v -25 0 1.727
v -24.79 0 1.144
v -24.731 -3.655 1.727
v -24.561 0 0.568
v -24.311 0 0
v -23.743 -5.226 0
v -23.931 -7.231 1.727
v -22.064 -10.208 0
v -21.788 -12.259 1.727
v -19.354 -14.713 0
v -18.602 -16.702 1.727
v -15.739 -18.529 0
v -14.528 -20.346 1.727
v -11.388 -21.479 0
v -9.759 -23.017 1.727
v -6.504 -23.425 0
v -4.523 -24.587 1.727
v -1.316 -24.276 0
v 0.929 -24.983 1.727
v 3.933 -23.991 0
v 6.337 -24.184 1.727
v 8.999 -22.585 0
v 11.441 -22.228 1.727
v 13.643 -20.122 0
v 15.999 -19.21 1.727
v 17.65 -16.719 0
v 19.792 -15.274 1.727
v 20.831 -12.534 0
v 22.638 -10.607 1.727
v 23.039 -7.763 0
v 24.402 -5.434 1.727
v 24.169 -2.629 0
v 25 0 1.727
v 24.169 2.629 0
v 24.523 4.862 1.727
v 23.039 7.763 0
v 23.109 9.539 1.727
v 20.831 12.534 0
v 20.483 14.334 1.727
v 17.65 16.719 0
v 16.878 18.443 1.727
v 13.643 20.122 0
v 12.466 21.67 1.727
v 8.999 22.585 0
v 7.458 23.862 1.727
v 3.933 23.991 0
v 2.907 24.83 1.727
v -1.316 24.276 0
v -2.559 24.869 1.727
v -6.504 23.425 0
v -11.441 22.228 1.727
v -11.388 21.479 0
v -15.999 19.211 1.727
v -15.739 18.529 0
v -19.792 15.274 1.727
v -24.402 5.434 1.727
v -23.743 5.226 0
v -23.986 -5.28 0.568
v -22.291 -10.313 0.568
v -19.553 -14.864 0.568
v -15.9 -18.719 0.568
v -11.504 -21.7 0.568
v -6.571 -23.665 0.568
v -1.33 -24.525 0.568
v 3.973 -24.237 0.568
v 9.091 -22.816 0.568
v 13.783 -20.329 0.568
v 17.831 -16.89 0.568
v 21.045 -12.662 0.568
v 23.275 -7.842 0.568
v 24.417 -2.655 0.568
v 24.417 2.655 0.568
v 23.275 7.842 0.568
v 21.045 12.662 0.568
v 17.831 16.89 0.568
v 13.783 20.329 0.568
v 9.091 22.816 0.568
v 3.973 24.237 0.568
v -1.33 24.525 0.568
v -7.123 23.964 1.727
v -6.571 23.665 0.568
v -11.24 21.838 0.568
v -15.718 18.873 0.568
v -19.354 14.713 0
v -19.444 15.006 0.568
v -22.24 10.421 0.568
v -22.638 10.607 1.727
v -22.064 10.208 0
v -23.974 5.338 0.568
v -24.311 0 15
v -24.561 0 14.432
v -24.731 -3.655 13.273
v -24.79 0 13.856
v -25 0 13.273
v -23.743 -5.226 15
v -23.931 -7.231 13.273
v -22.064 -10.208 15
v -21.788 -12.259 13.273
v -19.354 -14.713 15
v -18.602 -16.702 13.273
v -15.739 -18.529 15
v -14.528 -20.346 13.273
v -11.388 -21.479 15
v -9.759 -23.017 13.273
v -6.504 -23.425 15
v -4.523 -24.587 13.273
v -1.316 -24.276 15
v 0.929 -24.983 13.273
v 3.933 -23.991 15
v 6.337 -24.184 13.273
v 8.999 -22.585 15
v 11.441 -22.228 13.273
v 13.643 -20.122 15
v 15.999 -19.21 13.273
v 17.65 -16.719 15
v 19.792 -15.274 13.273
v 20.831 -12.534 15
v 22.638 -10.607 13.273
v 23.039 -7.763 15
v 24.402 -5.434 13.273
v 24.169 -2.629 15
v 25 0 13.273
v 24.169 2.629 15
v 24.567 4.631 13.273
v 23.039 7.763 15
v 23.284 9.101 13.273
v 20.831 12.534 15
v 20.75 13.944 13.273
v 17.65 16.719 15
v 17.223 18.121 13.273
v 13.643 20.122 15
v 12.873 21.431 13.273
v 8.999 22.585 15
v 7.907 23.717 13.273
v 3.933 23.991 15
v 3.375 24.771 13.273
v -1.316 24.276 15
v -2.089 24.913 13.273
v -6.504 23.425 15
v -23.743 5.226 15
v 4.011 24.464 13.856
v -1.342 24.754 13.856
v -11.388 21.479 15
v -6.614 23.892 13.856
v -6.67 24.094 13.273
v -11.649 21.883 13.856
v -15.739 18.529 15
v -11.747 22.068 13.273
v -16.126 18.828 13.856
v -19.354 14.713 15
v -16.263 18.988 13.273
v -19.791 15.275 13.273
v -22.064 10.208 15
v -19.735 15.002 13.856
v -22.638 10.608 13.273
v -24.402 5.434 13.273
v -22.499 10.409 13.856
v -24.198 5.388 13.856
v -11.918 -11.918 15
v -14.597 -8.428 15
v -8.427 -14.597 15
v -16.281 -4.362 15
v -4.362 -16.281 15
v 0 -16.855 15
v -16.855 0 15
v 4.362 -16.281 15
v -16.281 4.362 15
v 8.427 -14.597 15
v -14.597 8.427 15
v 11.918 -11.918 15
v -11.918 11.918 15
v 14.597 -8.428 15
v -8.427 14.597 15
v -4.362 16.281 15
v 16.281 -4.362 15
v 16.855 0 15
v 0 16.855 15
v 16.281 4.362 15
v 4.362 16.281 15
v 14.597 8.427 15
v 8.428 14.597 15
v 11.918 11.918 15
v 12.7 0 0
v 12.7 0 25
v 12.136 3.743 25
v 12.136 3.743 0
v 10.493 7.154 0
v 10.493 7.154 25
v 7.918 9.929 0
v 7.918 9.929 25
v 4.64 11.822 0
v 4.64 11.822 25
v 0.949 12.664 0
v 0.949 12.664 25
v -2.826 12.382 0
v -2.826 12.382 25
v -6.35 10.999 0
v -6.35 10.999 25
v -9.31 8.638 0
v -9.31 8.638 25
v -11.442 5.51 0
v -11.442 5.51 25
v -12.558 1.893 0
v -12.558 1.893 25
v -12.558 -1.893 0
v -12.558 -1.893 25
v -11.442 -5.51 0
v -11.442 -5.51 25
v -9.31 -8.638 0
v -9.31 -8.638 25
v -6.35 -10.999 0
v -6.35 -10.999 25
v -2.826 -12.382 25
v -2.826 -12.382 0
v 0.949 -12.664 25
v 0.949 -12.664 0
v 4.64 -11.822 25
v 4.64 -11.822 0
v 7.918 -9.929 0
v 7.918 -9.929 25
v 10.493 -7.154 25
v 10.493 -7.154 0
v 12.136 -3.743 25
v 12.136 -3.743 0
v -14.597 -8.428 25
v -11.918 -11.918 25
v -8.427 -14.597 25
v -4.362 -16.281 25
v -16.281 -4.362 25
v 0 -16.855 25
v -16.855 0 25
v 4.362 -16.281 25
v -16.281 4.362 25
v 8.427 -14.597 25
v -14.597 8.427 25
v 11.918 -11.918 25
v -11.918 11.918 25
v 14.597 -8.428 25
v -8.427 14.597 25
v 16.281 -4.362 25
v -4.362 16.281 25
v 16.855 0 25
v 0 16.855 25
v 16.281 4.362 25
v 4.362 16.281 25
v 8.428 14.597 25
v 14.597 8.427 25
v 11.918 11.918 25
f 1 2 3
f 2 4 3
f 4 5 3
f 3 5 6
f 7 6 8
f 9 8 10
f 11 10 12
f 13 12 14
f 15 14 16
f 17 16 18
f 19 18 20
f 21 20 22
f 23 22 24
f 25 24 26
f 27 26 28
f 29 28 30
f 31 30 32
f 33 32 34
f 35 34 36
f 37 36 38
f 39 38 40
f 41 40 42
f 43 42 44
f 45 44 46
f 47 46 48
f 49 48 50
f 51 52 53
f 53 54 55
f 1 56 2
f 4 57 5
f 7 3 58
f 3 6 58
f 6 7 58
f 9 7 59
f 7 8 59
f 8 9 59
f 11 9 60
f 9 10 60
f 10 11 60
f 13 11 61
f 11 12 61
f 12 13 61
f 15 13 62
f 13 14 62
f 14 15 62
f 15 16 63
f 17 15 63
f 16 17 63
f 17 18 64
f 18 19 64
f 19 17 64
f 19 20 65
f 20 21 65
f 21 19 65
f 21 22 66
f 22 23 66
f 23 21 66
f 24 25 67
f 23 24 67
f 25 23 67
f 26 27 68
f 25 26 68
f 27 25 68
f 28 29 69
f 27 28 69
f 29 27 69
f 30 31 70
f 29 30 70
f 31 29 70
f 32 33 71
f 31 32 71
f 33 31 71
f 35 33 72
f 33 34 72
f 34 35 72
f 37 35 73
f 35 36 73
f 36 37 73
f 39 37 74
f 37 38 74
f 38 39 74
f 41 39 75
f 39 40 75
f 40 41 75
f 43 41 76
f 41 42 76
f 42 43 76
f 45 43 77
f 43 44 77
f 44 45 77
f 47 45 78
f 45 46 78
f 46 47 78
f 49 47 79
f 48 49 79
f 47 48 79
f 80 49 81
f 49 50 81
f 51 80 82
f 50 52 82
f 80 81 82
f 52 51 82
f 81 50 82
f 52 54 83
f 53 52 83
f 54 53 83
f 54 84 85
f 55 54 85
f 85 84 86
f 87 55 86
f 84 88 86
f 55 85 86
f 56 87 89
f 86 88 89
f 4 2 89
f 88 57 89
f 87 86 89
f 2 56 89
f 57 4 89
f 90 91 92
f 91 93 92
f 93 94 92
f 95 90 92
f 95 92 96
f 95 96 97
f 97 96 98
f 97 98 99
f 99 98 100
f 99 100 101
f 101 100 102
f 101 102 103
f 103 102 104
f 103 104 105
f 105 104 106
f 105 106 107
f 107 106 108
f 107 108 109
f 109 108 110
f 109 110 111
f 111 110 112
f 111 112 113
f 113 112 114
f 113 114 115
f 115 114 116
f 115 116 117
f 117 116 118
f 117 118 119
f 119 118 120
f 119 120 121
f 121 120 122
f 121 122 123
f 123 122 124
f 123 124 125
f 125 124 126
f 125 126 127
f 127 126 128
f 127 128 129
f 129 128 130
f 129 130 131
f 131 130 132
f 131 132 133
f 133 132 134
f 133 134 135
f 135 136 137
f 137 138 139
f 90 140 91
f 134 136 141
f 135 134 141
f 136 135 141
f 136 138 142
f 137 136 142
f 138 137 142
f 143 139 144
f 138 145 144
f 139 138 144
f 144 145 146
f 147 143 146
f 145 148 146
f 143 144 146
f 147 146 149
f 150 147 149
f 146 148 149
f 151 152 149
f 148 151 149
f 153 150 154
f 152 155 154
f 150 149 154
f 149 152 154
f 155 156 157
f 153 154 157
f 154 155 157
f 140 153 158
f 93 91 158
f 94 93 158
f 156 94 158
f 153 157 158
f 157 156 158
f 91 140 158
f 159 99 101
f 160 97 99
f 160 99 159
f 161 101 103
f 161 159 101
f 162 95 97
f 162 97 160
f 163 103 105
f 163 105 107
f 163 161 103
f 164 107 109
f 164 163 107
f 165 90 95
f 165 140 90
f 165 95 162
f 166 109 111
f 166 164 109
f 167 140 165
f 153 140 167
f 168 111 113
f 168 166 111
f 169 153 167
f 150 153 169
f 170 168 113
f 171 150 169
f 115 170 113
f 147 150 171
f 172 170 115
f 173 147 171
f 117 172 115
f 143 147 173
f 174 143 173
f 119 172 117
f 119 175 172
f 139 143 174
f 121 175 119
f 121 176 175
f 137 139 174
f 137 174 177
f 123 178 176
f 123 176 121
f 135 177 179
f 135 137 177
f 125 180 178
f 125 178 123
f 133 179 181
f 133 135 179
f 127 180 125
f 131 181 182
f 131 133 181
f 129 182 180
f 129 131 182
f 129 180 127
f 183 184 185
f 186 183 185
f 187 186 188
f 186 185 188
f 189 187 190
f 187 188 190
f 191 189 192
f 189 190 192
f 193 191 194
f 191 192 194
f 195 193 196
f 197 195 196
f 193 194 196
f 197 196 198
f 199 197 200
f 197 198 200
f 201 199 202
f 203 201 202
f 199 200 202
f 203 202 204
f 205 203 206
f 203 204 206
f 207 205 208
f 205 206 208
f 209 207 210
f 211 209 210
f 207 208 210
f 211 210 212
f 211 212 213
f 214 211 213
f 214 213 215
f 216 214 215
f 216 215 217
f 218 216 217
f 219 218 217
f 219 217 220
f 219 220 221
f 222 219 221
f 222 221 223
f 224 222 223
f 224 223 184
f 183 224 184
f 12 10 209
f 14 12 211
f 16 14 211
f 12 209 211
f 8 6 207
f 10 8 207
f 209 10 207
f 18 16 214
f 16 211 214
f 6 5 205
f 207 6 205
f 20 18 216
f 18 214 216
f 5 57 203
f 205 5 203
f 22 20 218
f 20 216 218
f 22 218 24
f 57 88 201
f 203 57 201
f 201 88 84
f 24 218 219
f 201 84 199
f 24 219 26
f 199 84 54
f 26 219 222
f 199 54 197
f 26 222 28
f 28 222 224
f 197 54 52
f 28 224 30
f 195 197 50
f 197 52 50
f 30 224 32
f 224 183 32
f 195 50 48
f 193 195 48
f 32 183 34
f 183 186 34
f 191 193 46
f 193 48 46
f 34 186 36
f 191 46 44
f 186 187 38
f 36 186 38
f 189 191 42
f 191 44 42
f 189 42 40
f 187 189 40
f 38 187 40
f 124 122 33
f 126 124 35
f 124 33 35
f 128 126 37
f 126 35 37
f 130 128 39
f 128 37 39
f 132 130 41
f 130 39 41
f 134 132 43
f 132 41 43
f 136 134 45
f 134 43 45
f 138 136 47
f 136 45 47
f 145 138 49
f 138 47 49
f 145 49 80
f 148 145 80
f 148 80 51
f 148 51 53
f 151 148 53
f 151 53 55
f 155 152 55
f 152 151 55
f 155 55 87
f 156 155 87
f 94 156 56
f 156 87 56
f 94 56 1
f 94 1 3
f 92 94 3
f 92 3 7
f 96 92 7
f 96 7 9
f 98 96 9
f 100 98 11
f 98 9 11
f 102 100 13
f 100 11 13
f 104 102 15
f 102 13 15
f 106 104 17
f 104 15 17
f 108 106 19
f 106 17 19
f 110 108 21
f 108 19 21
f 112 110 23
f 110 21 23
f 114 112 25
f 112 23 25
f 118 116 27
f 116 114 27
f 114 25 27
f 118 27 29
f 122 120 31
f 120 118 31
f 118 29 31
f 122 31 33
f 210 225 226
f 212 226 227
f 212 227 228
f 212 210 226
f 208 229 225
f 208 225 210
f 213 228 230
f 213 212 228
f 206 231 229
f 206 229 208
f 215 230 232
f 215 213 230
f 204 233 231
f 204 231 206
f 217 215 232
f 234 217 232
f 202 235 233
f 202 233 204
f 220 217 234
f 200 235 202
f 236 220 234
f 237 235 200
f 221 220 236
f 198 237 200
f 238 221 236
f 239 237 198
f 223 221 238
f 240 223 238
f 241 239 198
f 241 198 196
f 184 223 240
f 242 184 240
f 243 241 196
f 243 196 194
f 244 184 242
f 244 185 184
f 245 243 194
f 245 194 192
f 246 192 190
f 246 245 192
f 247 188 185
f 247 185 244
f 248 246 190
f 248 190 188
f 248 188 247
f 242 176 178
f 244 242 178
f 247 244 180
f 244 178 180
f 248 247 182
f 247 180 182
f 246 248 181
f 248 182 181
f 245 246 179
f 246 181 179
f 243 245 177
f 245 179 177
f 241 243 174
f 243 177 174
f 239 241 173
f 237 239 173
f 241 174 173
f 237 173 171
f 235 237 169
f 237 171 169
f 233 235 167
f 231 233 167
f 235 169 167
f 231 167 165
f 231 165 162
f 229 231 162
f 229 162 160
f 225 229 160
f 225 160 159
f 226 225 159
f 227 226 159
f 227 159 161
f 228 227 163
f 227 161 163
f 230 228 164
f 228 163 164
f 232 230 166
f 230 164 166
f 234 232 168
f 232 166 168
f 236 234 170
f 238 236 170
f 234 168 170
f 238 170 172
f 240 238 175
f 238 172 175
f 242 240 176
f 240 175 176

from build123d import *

# Parameters (mm, degrees)
SKETCH1_R           = 25
BOSS_EXTRUDE1_DEPTH = 15
SKETCH2_R           = 16.855
BOSS_EXTRUDE2_DEPTH = 10
SKETCH3_R           = 12.7
CUT_EXTRUDE1_DEPTH  = 30


with BuildPart() as part:
    # Sketch1 → Boss-Extrude1 (new body)
    with BuildSketch(Plane.XY):
        Circle(SKETCH1_R)
    extrude(amount=BOSS_EXTRUDE1_DEPTH)

    # Sketch2 → Boss-Extrude2 (add)
    with BuildSketch(Plane.XY.offset(15)):
        Circle(SKETCH2_R)
    extrude(amount=BOSS_EXTRUDE2_DEPTH)

    # Sketch3 → Cut-Extrude1 (cut)
    with BuildSketch(Plane.XY.offset(25)):
        Circle(SKETCH3_R)
    extrude(amount=-CUT_EXTRUDE1_DEPTH, mode=Mode.SUBTRACT)

    # Sketch8 → Cut-Revolve13 (revolve, cut)
    with BuildSketch(Plane(origin=(0, 0, 0), x_dir=(0, 0, -1), z_dir=(1, 0, 0)), mode=Mode.PRIVATE) as cut_revolve13_sk:
        with BuildLine():
            Line((-15, 26.011262748), (-15, 24.311262748))
            ThreePointArc((-15, 24.311262748), (-7.5, 25.954168843), (0, 24.311262748))
            Line((0, 24.311262748), (0, 26.011262748))
            Line((0, 26.011262748), (-15, 26.011262748))
        make_face()
    revolve(cut_revolve13_sk.sketch.rotate(Axis((0, 0, 0), (0, 0, 1)), 90), axis=Axis((0, 0, 0), (0, 0, 1)), mode=Mode.SUBTRACT)


solid = part.part
